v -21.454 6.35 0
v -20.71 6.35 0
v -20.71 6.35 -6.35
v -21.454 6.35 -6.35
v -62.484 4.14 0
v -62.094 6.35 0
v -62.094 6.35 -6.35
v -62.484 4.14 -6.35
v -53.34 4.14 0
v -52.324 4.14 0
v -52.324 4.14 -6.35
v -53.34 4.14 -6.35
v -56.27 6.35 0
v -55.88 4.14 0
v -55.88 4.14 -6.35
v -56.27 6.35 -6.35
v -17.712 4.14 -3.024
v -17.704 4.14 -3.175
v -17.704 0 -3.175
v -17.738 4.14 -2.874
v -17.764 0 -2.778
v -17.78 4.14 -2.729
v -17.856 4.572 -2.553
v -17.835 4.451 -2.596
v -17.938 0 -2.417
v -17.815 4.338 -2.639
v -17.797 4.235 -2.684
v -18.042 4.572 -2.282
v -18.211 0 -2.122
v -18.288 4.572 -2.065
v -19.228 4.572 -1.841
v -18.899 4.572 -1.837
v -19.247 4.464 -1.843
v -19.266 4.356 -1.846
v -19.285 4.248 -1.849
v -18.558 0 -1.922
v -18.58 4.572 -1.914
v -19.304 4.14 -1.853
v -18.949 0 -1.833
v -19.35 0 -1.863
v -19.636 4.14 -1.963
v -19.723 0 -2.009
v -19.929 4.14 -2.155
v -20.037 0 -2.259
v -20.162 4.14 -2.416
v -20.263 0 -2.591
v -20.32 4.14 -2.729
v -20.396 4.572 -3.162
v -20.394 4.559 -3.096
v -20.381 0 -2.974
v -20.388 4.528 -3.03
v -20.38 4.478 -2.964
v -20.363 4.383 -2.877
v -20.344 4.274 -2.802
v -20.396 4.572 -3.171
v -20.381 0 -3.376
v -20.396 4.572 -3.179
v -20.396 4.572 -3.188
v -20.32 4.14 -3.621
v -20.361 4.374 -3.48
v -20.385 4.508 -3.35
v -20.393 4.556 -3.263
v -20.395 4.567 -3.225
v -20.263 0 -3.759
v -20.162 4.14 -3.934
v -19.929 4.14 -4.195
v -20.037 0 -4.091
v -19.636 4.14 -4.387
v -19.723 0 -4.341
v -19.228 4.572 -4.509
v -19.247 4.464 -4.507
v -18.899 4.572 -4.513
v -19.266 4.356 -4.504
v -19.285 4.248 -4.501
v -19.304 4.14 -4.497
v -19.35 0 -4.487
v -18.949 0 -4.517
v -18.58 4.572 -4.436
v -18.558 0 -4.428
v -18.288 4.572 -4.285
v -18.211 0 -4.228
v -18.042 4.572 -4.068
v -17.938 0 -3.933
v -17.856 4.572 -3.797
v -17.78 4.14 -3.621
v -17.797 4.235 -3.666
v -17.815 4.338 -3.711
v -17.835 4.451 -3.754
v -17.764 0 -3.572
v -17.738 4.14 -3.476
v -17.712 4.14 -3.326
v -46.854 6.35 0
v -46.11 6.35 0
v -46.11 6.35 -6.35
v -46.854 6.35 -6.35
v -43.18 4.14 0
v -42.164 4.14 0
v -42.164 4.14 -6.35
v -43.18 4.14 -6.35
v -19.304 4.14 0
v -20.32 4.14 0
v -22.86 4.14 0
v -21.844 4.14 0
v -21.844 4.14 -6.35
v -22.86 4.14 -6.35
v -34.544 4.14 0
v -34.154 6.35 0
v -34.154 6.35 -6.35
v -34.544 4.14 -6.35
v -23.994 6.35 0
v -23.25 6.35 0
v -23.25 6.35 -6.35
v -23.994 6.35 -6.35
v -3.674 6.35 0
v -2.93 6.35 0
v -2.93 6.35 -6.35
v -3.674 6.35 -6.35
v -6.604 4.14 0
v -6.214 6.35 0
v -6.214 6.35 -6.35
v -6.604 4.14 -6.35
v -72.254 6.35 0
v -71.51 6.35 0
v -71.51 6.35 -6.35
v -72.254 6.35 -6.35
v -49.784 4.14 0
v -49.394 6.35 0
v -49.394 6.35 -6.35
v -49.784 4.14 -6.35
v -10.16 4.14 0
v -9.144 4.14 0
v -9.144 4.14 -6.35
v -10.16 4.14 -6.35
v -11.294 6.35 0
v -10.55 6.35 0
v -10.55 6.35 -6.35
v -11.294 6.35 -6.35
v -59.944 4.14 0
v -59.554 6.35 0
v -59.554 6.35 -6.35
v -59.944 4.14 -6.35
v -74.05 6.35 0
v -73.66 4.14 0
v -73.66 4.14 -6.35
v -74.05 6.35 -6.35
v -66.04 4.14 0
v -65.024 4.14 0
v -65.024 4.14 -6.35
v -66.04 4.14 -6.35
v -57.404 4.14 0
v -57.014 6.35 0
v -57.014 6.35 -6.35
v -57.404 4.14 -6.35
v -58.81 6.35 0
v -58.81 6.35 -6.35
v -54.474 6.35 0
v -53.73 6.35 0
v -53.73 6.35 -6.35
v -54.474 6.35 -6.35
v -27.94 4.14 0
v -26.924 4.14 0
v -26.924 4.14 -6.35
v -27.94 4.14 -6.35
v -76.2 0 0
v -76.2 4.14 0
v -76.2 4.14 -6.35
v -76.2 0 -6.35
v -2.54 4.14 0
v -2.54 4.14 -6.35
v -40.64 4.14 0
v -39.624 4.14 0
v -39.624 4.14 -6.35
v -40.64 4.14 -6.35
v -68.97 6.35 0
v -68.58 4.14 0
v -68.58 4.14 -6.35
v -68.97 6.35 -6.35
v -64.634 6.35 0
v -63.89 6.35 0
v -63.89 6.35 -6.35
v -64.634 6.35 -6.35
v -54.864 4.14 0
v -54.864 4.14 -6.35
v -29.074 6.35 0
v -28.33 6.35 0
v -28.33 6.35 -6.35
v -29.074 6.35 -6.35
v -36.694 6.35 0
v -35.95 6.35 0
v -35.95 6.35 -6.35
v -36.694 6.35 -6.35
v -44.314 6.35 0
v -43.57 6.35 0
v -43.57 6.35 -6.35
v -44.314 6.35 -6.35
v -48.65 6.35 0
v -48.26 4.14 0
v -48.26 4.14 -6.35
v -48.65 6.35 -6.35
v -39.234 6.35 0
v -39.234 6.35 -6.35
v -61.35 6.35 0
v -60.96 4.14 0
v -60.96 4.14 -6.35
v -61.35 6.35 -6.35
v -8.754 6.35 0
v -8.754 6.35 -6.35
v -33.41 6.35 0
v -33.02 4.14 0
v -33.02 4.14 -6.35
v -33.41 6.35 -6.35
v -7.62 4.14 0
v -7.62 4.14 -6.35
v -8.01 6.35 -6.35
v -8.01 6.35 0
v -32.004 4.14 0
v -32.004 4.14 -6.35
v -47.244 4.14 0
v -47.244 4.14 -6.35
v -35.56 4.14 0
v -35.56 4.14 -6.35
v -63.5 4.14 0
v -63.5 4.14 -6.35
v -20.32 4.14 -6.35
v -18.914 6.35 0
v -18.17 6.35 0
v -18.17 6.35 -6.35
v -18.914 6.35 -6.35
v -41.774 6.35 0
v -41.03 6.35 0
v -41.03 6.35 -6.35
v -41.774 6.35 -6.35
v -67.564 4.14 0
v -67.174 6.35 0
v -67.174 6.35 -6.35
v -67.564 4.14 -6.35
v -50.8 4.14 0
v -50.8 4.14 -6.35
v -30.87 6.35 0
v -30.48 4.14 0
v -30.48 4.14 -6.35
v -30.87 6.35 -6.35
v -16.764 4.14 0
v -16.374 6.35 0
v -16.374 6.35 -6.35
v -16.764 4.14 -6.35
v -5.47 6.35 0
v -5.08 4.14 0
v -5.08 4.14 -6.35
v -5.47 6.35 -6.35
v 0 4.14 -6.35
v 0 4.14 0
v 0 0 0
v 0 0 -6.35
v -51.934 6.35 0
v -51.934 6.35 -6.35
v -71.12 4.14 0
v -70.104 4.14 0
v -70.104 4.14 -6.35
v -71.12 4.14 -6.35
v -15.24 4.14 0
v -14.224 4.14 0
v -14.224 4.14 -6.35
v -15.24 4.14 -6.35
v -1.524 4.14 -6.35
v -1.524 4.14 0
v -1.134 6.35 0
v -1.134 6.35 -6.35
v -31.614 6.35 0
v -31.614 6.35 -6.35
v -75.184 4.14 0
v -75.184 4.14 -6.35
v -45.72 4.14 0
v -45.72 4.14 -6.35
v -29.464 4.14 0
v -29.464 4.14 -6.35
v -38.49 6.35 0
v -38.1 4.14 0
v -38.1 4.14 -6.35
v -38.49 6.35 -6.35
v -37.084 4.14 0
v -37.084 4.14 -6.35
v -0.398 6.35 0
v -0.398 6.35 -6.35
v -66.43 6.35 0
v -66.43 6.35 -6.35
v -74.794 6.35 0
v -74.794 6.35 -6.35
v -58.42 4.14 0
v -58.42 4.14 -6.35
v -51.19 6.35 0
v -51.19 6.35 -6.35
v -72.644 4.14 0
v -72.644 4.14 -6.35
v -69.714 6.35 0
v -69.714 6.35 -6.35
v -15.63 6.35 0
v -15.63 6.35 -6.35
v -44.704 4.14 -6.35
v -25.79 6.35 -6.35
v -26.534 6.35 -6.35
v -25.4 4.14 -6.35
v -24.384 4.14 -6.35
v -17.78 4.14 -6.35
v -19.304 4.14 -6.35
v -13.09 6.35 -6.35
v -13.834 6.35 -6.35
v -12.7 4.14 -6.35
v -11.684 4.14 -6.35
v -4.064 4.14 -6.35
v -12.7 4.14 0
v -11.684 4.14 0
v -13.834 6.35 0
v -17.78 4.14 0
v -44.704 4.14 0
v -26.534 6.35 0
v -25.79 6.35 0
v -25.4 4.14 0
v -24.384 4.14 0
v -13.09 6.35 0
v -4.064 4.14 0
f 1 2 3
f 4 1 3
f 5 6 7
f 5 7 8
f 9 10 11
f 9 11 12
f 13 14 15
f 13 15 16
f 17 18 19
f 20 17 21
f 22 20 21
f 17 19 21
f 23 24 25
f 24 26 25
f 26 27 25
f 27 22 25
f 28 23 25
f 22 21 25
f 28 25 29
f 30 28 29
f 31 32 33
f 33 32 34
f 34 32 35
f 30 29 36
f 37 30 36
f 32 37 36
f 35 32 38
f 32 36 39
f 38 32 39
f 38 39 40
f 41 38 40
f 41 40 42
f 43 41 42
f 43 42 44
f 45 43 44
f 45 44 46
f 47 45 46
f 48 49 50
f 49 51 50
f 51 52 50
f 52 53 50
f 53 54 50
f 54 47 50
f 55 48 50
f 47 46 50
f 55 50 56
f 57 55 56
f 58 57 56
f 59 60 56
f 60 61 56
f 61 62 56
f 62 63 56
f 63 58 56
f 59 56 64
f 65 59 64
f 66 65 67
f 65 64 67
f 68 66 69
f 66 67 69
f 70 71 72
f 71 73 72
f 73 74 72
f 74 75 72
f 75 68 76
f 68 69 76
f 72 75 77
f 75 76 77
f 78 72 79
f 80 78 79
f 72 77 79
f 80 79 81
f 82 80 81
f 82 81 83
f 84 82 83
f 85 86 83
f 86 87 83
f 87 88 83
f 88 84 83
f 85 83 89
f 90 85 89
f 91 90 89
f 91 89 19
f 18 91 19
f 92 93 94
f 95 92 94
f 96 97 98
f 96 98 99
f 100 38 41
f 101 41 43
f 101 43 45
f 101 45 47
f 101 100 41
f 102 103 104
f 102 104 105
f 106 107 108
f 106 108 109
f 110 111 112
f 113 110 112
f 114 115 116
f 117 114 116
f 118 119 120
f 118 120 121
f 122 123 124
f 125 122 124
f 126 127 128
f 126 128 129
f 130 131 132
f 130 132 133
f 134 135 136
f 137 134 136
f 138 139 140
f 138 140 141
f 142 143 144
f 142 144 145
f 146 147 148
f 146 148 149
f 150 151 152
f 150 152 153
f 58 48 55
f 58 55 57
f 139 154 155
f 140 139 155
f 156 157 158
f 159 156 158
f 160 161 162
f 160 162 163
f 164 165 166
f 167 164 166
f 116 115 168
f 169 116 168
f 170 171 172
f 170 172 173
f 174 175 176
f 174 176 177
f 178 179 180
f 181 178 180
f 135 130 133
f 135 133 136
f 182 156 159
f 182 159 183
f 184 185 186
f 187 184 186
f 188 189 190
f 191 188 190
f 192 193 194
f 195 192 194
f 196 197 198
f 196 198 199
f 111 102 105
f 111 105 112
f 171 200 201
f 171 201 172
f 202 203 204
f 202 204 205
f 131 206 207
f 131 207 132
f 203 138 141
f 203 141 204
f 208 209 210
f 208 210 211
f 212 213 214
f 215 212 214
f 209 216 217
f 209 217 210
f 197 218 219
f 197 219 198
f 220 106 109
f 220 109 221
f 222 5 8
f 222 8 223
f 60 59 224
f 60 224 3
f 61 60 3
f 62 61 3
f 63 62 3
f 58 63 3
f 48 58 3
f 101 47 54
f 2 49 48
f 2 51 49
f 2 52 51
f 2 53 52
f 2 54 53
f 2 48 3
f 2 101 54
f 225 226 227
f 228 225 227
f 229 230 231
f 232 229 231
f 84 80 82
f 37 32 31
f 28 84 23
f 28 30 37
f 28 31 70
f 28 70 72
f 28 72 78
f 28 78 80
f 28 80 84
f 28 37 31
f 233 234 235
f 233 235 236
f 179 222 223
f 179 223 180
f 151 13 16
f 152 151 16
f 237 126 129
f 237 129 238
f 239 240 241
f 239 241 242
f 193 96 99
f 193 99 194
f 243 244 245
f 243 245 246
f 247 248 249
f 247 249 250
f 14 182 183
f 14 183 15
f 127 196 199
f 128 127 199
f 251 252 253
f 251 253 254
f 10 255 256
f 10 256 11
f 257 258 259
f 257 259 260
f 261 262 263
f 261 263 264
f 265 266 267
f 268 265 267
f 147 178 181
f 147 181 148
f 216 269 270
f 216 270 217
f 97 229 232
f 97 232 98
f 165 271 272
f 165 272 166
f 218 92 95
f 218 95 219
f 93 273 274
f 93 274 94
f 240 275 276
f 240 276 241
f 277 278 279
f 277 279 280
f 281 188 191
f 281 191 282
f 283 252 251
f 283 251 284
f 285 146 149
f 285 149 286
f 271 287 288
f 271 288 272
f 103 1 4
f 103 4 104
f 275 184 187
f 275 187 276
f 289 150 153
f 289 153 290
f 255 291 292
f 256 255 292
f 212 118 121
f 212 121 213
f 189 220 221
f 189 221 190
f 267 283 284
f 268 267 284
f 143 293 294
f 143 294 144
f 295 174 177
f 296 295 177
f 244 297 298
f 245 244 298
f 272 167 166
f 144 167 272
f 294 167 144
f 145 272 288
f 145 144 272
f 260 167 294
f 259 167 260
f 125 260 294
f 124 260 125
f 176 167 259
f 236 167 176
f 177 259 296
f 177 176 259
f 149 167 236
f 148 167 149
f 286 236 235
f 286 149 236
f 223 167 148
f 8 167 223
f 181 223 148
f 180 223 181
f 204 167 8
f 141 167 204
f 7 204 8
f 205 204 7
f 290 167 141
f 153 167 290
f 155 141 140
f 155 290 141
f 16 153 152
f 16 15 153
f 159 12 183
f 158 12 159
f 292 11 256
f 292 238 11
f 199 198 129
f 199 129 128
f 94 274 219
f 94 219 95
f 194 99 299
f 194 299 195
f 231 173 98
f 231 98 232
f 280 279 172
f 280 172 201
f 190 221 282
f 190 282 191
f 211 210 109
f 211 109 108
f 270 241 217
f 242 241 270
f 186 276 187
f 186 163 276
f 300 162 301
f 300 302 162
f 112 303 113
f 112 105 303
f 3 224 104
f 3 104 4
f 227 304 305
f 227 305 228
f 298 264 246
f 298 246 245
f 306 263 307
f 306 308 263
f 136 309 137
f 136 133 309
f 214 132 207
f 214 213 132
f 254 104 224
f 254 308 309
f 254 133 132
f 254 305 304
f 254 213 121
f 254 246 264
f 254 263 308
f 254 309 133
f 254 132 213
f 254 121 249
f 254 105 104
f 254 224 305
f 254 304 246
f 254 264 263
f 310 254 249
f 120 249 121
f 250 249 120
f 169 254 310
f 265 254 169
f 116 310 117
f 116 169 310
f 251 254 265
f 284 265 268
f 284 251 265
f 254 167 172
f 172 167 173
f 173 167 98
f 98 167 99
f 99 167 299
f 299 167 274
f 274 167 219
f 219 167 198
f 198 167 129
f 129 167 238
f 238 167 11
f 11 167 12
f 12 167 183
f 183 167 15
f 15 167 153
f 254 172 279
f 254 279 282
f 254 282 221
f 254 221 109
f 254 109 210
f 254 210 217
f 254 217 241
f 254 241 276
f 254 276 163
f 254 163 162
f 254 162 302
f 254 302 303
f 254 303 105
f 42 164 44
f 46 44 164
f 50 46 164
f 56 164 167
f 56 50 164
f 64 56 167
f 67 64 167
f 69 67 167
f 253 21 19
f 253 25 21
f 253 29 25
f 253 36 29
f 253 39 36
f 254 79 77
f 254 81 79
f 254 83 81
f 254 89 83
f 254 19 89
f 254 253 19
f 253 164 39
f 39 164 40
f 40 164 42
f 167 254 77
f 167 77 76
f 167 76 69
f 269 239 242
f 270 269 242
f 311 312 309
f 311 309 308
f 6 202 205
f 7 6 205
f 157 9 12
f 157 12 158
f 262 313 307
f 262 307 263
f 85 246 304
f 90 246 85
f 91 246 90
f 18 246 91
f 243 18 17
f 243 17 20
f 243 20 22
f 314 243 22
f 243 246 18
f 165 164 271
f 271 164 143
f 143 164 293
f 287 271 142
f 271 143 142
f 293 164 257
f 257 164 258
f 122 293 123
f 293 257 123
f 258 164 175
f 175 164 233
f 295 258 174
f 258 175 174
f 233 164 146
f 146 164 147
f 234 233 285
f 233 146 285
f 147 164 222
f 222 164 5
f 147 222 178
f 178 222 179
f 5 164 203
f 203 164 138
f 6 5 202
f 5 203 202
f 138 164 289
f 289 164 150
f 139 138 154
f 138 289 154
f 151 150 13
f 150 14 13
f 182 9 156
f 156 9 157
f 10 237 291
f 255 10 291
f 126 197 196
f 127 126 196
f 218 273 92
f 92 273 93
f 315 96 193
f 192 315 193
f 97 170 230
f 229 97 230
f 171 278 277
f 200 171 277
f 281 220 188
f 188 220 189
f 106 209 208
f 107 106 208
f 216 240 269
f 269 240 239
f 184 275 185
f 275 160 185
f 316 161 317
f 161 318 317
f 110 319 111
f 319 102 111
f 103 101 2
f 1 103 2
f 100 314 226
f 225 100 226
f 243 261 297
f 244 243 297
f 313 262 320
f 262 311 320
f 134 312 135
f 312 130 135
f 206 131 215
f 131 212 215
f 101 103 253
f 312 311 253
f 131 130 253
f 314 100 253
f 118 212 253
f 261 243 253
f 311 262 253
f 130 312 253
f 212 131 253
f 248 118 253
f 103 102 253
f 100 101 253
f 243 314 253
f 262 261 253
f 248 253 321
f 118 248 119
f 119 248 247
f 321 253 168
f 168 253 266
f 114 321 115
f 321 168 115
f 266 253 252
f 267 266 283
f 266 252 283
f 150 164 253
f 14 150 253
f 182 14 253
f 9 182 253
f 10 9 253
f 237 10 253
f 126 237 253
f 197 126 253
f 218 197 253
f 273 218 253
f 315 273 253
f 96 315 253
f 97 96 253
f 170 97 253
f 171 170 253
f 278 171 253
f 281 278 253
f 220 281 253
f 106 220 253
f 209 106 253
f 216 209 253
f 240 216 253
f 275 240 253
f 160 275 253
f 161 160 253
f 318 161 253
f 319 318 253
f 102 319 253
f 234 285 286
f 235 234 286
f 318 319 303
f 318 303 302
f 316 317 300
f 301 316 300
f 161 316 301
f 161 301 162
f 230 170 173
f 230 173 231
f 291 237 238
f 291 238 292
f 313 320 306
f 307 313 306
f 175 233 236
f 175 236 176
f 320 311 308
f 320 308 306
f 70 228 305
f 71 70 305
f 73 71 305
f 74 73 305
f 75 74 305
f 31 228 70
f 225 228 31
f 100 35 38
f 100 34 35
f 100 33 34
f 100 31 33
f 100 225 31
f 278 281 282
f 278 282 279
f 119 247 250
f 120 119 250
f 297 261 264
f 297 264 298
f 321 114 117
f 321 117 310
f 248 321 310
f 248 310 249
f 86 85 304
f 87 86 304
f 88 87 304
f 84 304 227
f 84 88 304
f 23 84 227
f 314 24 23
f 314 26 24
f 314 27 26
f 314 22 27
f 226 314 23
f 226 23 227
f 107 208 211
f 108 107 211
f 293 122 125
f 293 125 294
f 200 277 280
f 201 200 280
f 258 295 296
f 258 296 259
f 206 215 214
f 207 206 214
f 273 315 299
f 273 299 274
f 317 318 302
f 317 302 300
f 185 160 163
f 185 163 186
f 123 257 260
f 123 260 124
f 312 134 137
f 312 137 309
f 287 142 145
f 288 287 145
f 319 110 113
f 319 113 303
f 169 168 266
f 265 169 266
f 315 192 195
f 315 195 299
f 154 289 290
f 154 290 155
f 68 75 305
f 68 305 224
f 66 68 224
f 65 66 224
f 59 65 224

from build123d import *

# Parameters (mm, degrees)
SKETCH1_W           = 6.35
SKETCH1_H           = 6.35
BOSS_EXTRUDE1_DEPTH = 76.2
CUT_EXTRUDE1_DEPTH  = 76.2
SKETCH3_R           = 1.3462
CUT_EXTRUDE2_DEPTH  = 4.572


with BuildPart() as part:
    # Sketch1 → Boss-Extrude1 (new body)
    with BuildSketch(Plane(origin=(0, 0, 0), x_dir=(0, 0, -1), z_dir=(1, 0, 0))):
        with Locations((3.175, 3.175)):
            Rectangle(SKETCH1_W, SKETCH1_H)
    extrude(amount=-BOSS_EXTRUDE1_DEPTH)

    # Sketch2 → Cut-Extrude1 (cut)
    with BuildSketch(Plane.XY):
        Polygon((-5.08, 4.1402), (-5.469647362, 6.35), (-3.674352638, 6.35), (-4.064, 4.1402), align=None)
        Polygon((-1.524, 4.1402), (-1.134352638, 6.35), (-2.929647362, 6.35), (-2.54, 4.1402), align=None)
        Polygon((-7.62, 4.1402), (-8.009647362, 6.35), (-6.214352638, 6.35), (-6.604, 4.1402), align=None)
        Polygon((-10.16, 4.1402), (-10.549647362, 6.35), (-8.754352638, 6.35), (-9.144, 4.1402), align=None)
        Polygon((-12.7, 4.1402), (-13.089647362, 6.35), (-11.294352638, 6.35), (-11.684, 4.1402), align=None)
        Polygon((-15.24, 4.1402), (-15.629647362, 6.35), (-13.834352638, 6.35), (-14.224, 4.1402), align=None)
        Polygon((-17.78, 4.1402), (-18.169647362, 6.35), (-16.374352638, 6.35), (-16.764, 4.1402), align=None)
        Polygon((-20.32, 4.1402), (-20.709647362, 6.35), (-18.914352638, 6.35), (-19.304, 4.1402), align=None)
        Polygon((-22.86, 4.1402), (-23.249647362, 6.35), (-21.454352638, 6.35), (-21.844, 4.1402), align=None)
        Polygon((-25.4, 4.1402), (-25.789647362, 6.35), (-23.994352638, 6.35), (-24.384, 4.1402), align=None)
        Polygon((-27.94, 4.1402), (-28.329647362, 6.35), (-26.534352638, 6.35), (-26.924, 4.1402), align=None)
        Polygon((-30.48, 4.1402), (-30.869647362, 6.35), (-29.074352638, 6.35), (-29.464, 4.1402), align=None)
        Polygon((-33.02, 4.1402), (-33.409647362, 6.35), (-31.614352638, 6.35), (-32.004, 4.1402), align=None)
        Polygon((-35.56, 4.1402), (-35.949647362, 6.35), (-34.154352638, 6.35), (-34.544, 4.1402), align=None)
        Polygon((-38.1, 4.1402), (-38.489647362, 6.35), (-36.694352638, 6.35), (-37.084, 4.1402), align=None)
        Polygon((-40.64, 4.1402), (-41.029647362, 6.35), (-39.234352638, 6.35), (-39.624, 4.1402), align=None)
        Polygon((-43.18, 4.1402), (-43.569647362, 6.35), (-41.774352638, 6.35), (-42.164, 4.1402), align=None)
        Polygon((-45.72, 4.1402), (-46.109647362, 6.35), (-44.314352638, 6.35), (-44.704, 4.1402), align=None)
        Polygon((-48.26, 4.1402), (-48.649647362, 6.35), (-46.854352638, 6.35), (-47.244, 4.1402), align=None)
        Polygon((-50.8, 4.1402), (-51.189647362, 6.35), (-49.394352638, 6.35), (-49.784, 4.1402), align=None)
        Polygon((-53.34, 4.1402), (-53.729647362, 6.35), (-51.934352638, 6.35), (-52.324, 4.1402), align=None)
        Polygon((-55.88, 4.1402), (-56.269647362, 6.35), (-54.474352638, 6.35), (-54.864, 4.1402), align=None)
        Polygon((-58.42, 4.1402), (-58.809647362, 6.35), (-57.014352638, 6.35), (-57.404, 4.1402), align=None)
        Polygon((-60.96, 4.1402), (-61.349647362, 6.35), (-59.554352638, 6.35), (-59.944, 4.1402), align=None)
        Polygon((-63.5, 4.1402), (-63.889647362, 6.35), (-62.094352638, 6.35), (-62.484, 4.1402), align=None)
        Polygon((-66.04, 4.1402), (-66.429647362, 6.35), (-64.634352638, 6.35), (-65.024, 4.1402), align=None)
        Polygon((-68.58, 4.1402), (-68.969647362, 6.35), (-67.174352638, 6.35), (-67.564, 4.1402), align=None)
        Polygon((-71.12, 4.1402), (-71.509647362, 6.35), (-69.714352638, 6.35), (-70.104, 4.1402), align=None)
        Polygon((-73.66, 4.1402), (-74.049647362, 6.35), (-72.254352638, 6.35), (-72.644, 4.1402), align=None)
        Polygon((-76.2, 4.1402), (-76.589647362, 6.35), (-74.794352638, 6.35), (-75.184, 4.1402), align=None)
        Polygon((-78.74, 4.1402), (-79.129647362, 6.35), (-77.334352638, 6.35), (-77.724, 4.1402), align=None)
        Polygon((-81.28, 4.1402), (-81.669647362, 6.35), (-79.874352638, 6.35), (-80.264, 4.1402), align=None)
        Polygon((-83.82, 4.1402), (-84.209647362, 6.35), (-82.414352638, 6.35), (-82.804, 4.1402), align=None)
        Polygon((-86.36, 4.1402), (-86.749647362, 6.35), (-84.954352638, 6.35), (-85.344, 4.1402), align=None)
        Polygon((-88.9, 4.1402), (-89.289647362, 6.35), (-87.494352638, 6.35), (-87.884, 4.1402), align=None)
        Polygon((-91.44, 4.1402), (-91.829647362, 6.35), (-90.034352638, 6.35), (-90.424, 4.1402), align=None)
        Polygon((-93.98, 4.1402), (-94.369647362, 6.35), (-92.574352638, 6.35), (-92.964, 4.1402), align=None)
        Polygon((-96.52, 4.1402), (-96.909647362, 6.35), (-95.114352638, 6.35), (-95.504, 4.1402), align=None)
        Polygon((-99.06, 4.1402), (-99.449647362, 6.35), (-97.654352638, 6.35), (-98.044, 4.1402), align=None)
        Polygon((-101.6, 4.1402), (-101.989647362, 6.35), (-100.194352638, 6.35), (-100.584, 4.1402), align=None)
        Polygon((-104.14, 4.1402), (-104.529647362, 6.35), (-102.734352638, 6.35), (-103.124, 4.1402), align=None)
        Polygon((-106.68, 4.1402), (-107.069647362, 6.35), (-105.274352638, 6.35), (-105.664, 4.1402), align=None)
        Polygon((-109.22, 4.1402), (-109.609647362, 6.35), (-107.814352638, 6.35), (-108.204, 4.1402), align=None)
        Polygon((-111.76, 4.1402), (-112.149647362, 6.35), (-110.354352638, 6.35), (-110.744, 4.1402), align=None)
        Polygon((-114.3, 4.1402), (-114.689647362, 6.35), (-112.894352638, 6.35), (-113.284, 4.1402), align=None)
        Polygon((-116.84, 4.1402), (-117.229647362, 6.35), (-115.434352638, 6.35), (-115.824, 4.1402), align=None)
        Polygon((-119.38, 4.1402), (-119.769647362, 6.35), (-117.974352638, 6.35), (-118.364, 4.1402), align=None)
        Polygon((-121.92, 4.1402), (-122.309647362, 6.35), (-120.514352638, 6.35), (-120.904, 4.1402), align=None)
        Polygon((-124.46, 4.1402), (-124.849647362, 6.35), (-123.054352638, 6.35), (-123.444, 4.1402), align=None)
        Polygon((-127, 4.1402), (-127.389647362, 6.35), (-125.594352638, 6.35), (-125.984, 4.1402), align=None)
        Polygon((-129.54, 4.1402), (-129.929647362, 6.35), (-128.134352638, 6.35), (-128.524, 4.1402), align=None)
        Polygon((-132.08, 4.1402), (-132.469647362, 6.35), (-130.674352638, 6.35), (-131.064, 4.1402), align=None)
        Polygon((-134.62, 4.1402), (-135.009647362, 6.35), (-133.214352638, 6.35), (-133.604, 4.1402), align=None)
        Polygon((-137.16, 4.1402), (-137.549647362, 6.35), (-135.754352638, 6.35), (-136.144, 4.1402), align=None)
        Polygon((-139.7, 4.1402), (-140.089647362, 6.35), (-138.294352638, 6.35), (-138.684, 4.1402), align=None)
        Polygon((-142.24, 4.1402), (-142.629647362, 6.35), (-140.834352638, 6.35), (-141.224, 4.1402), align=None)
        Polygon((-144.78, 4.1402), (-145.169647362, 6.35), (-143.374352638, 6.35), (-143.764, 4.1402), align=None)
        Polygon((-147.32, 4.1402), (-147.709647362, 6.35), (-145.914352638, 6.35), (-146.304, 4.1402), align=None)
        Polygon((-149.86, 4.1402), (-150.249647362, 6.35), (-148.454352638, 6.35), (-148.844, 4.1402), align=None)
        Polygon((-152.4, 4.1402), (-152.789647362, 6.35), (-150.994352638, 6.35), (-151.384, 4.1402), align=None)
        Polygon((-154.94, 4.1402), (-155.329647362, 6.35), (-153.534352638, 6.35), (-153.924, 4.1402), align=None)
        Polygon((-157.48, 4.1402), (-157.869647362, 6.35), (-156.074352638, 6.35), (-156.464, 4.1402), align=None)
        Polygon((-160.02, 4.1402), (-160.409647362, 6.35), (-158.614352638, 6.35), (-159.004, 4.1402), align=None)
        Polygon((-162.56, 4.1402), (-162.949647362, 6.35), (-161.154352638, 6.35), (-161.544, 4.1402), align=None)
        Polygon((-165.1, 4.1402), (-165.489647362, 6.35), (-163.694352638, 6.35), (-164.084, 4.1402), align=None)
        Polygon((-167.64, 4.1402), (-168.029647362, 6.35), (-166.234352638, 6.35), (-166.624, 4.1402), align=None)
        Polygon((-170.18, 4.1402), (-170.569647362, 6.35), (-168.774352638, 6.35), (-169.164, 4.1402), align=None)
        Polygon((-172.72, 4.1402), (-173.109647362, 6.35), (-171.314352638, 6.35), (-171.704, 4.1402), align=None)
        Polygon((-175.26, 4.1402), (-175.649647362, 6.35), (-173.854352638, 6.35), (-174.244, 4.1402), align=None)
        Polygon((-177.8, 4.1402), (-178.189647362, 6.35), (-176.394352638, 6.35), (-176.784, 4.1402), align=None)
        Polygon((-180.34, 4.1402), (-180.729647362, 6.35), (-178.934352638, 6.35), (-179.324, 4.1402), align=None)
        Polygon((-182.88, 4.1402), (-183.269647362, 6.35), (-181.474352638, 6.35), (-181.864, 4.1402), align=None)
        Polygon((-185.42, 4.1402), (-185.809647362, 6.35), (-184.014352638, 6.35), (-184.404, 4.1402), align=None)
        Polygon((-187.96, 4.1402), (-188.349647362, 6.35), (-186.554352638, 6.35), (-186.944, 4.1402), align=None)
        Polygon((-190.5, 4.1402), (-190.889647362, 6.35), (-189.094352638, 6.35), (-189.484, 4.1402), align=None)
        Polygon((-193.04, 4.1402), (-193.429647362, 6.35), (-191.634352638, 6.35), (-192.024, 4.1402), align=None)
        Polygon((-195.58, 4.1402), (-195.969647362, 6.35), (-194.174352638, 6.35), (-194.564, 4.1402), align=None)
        Polygon((-198.12, 4.1402), (-198.509647362, 6.35), (-196.714352638, 6.35), (-197.104, 4.1402), align=None)
        Polygon((-200.66, 4.1402), (-201.049647362, 6.35), (-199.254352638, 6.35), (-199.644, 4.1402), align=None)
        Polygon((-203.2, 4.1402), (-203.589647362, 6.35), (-201.794352638, 6.35), (-202.184, 4.1402), align=None)
        Polygon((-205.74, 4.1402), (-206.129647362, 6.35), (-204.334352638, 6.35), (-204.724, 4.1402), align=None)
        Polygon((-208.28, 4.1402), (-208.669647362, 6.35), (-206.874352638, 6.35), (-207.264, 4.1402), align=None)
        Polygon((-210.82, 4.1402), (-211.209647362, 6.35), (-209.414352638, 6.35), (-209.804, 4.1402), align=None)
        Polygon((-213.36, 4.1402), (-213.749647362, 6.35), (-211.954352638, 6.35), (-212.344, 4.1402), align=None)
        Polygon((-215.9, 4.1402), (-216.289647362, 6.35), (-214.494352638, 6.35), (-214.884, 4.1402), align=None)
        Polygon((-218.44, 4.1402), (-218.829647362, 6.35), (-217.034352638, 6.35), (-217.424, 4.1402), align=None)
        Polygon((-220.98, 4.1402), (-221.369647362, 6.35), (-219.574352638, 6.35), (-219.964, 4.1402), align=None)
        Polygon((-223.52, 4.1402), (-223.909647362, 6.35), (-222.114352638, 6.35), (-222.504, 4.1402), align=None)
        Polygon((-226.06, 4.1402), (-226.449647362, 6.35), (-224.654352638, 6.35), (-225.044, 4.1402), align=None)
        Polygon((-228.6, 4.1402), (-228.989647362, 6.35), (-227.194352638, 6.35), (-227.584, 4.1402), align=None)
        Polygon((-231.14, 4.1402), (-231.529647362, 6.35), (-229.734352638, 6.35), (-230.124, 4.1402), align=None)
        Polygon((-233.68, 4.1402), (-234.069647362, 6.35), (-232.274352638, 6.35), (-232.664, 4.1402), align=None)
        Polygon((-236.22, 4.1402), (-236.609647362, 6.35), (-234.814352638, 6.35), (-235.204, 4.1402), align=None)
        Polygon((-238.76, 4.1402), (-239.149647362, 6.35), (-237.354352638, 6.35), (-237.744, 4.1402), align=None)
        Polygon((-241.3, 4.1402), (-241.689647362, 6.35), (-239.894352638, 6.35), (-240.284, 4.1402), align=None)
        Polygon((-243.84, 4.1402), (-244.229647362, 6.35), (-242.434352638, 6.35), (-242.824, 4.1402), align=None)
        Polygon((-246.38, 4.1402), (-246.769647362, 6.35), (-244.974352638, 6.35), (-245.364, 4.1402), align=None)
        Polygon((-248.92, 4.1402), (-249.309647362, 6.35), (-247.514352638, 6.35), (-247.904, 4.1402), align=None)
        Polygon((-251.46, 4.1402), (-251.849647362, 6.35), (-250.054352638, 6.35), (-250.444, 4.1402), align=None)
        Polygon((-254, 4.1402), (-254.389647362, 6.35), (-252.594352638, 6.35), (-252.984, 4.1402), align=None)
        Polygon((-256.54, 4.1402), (-256.929647362, 6.35), (-255.134352638, 6.35), (-255.524, 4.1402), align=None)
        Polygon((-259.08, 4.1402), (-259.469647362, 6.35), (-257.674352638, 6.35), (-258.064, 4.1402), align=None)
        Polygon((-261.62, 4.1402), (-262.009647362, 6.35), (-260.214352638, 6.35), (-260.604, 4.1402), align=None)
        Polygon((-264.16, 4.1402), (-264.549647362, 6.35), (-262.754352638, 6.35), (-263.144, 4.1402), align=None)
        Polygon((-266.7, 4.1402), (-267.089647362, 6.35), (-265.294352638, 6.35), (-265.684, 4.1402), align=None)
        Polygon((-269.24, 4.1402), (-269.629647362, 6.35), (-267.834352638, 6.35), (-268.224, 4.1402), align=None)
        Polygon((-271.78, 4.1402), (-272.169647362, 6.35), (-270.374352638, 6.35), (-270.764, 4.1402), align=None)
        Polygon((-274.32, 4.1402), (-274.709647362, 6.35), (-272.914352638, 6.35), (-273.304, 4.1402), align=None)
        Polygon((-276.86, 4.1402), (-277.249647362, 6.35), (-275.454352638, 6.35), (-275.844, 4.1402), align=None)
        Polygon((-279.4, 4.1402), (-279.789647362, 6.35), (-277.994352638, 6.35), (-278.384, 4.1402), align=None)
        Polygon((-281.94, 4.1402), (-282.329647362, 6.35), (-280.534352638, 6.35), (-280.924, 4.1402), align=None)
        Polygon((-284.48, 4.1402), (-284.869647362, 6.35), (-283.074352638, 6.35), (-283.464, 4.1402), align=None)
        Polygon((-287.02, 4.1402), (-287.409647362, 6.35), (-285.614352638, 6.35), (-286.004, 4.1402), align=None)
        Polygon((-289.56, 4.1402), (-289.949647362, 6.35), (-288.154352638, 6.35), (-288.544, 4.1402), align=None)
        Polygon((-292.1, 4.1402), (-292.489647362, 6.35), (-290.694352638, 6.35), (-291.084, 4.1402), align=None)
        Polygon((-294.64, 4.1402), (-295.029647362, 6.35), (-293.234352638, 6.35), (-293.624, 4.1402), align=None)
        Polygon((-297.18, 4.1402), (-297.569647362, 6.35), (-295.774352638, 6.35), (-296.164, 4.1402), align=None)
        Polygon((-299.72, 4.1402), (-300.109647362, 6.35), (-298.314352638, 6.35), (-298.704, 4.1402), align=None)
        Polygon((-302.26, 4.1402), (-302.649647362, 6.35), (-300.854352638, 6.35), (-301.244, 4.1402), align=None)
        Polygon((-304.8, 4.1402), (-305.189647362, 6.35), (-303.394352638, 6.35), (-303.784, 4.1402), align=None)
        Polygon((-0.397752638, 6.35), (0, 6.35), (0, 4.1402), align=None)
    extrude(amount=-CUT_EXTRUDE1_DEPTH, mode=Mode.SUBTRACT)

    # Sketch3 → Cut-Extrude2 (cut)
    with BuildSketch(Plane.XZ):
        with Locations((-19.05, -3.175)):
            Circle(SKETCH3_R)
    extrude(amount=-CUT_EXTRUDE2_DEPTH, mode=Mode.SUBTRACT)


solid = part.part
